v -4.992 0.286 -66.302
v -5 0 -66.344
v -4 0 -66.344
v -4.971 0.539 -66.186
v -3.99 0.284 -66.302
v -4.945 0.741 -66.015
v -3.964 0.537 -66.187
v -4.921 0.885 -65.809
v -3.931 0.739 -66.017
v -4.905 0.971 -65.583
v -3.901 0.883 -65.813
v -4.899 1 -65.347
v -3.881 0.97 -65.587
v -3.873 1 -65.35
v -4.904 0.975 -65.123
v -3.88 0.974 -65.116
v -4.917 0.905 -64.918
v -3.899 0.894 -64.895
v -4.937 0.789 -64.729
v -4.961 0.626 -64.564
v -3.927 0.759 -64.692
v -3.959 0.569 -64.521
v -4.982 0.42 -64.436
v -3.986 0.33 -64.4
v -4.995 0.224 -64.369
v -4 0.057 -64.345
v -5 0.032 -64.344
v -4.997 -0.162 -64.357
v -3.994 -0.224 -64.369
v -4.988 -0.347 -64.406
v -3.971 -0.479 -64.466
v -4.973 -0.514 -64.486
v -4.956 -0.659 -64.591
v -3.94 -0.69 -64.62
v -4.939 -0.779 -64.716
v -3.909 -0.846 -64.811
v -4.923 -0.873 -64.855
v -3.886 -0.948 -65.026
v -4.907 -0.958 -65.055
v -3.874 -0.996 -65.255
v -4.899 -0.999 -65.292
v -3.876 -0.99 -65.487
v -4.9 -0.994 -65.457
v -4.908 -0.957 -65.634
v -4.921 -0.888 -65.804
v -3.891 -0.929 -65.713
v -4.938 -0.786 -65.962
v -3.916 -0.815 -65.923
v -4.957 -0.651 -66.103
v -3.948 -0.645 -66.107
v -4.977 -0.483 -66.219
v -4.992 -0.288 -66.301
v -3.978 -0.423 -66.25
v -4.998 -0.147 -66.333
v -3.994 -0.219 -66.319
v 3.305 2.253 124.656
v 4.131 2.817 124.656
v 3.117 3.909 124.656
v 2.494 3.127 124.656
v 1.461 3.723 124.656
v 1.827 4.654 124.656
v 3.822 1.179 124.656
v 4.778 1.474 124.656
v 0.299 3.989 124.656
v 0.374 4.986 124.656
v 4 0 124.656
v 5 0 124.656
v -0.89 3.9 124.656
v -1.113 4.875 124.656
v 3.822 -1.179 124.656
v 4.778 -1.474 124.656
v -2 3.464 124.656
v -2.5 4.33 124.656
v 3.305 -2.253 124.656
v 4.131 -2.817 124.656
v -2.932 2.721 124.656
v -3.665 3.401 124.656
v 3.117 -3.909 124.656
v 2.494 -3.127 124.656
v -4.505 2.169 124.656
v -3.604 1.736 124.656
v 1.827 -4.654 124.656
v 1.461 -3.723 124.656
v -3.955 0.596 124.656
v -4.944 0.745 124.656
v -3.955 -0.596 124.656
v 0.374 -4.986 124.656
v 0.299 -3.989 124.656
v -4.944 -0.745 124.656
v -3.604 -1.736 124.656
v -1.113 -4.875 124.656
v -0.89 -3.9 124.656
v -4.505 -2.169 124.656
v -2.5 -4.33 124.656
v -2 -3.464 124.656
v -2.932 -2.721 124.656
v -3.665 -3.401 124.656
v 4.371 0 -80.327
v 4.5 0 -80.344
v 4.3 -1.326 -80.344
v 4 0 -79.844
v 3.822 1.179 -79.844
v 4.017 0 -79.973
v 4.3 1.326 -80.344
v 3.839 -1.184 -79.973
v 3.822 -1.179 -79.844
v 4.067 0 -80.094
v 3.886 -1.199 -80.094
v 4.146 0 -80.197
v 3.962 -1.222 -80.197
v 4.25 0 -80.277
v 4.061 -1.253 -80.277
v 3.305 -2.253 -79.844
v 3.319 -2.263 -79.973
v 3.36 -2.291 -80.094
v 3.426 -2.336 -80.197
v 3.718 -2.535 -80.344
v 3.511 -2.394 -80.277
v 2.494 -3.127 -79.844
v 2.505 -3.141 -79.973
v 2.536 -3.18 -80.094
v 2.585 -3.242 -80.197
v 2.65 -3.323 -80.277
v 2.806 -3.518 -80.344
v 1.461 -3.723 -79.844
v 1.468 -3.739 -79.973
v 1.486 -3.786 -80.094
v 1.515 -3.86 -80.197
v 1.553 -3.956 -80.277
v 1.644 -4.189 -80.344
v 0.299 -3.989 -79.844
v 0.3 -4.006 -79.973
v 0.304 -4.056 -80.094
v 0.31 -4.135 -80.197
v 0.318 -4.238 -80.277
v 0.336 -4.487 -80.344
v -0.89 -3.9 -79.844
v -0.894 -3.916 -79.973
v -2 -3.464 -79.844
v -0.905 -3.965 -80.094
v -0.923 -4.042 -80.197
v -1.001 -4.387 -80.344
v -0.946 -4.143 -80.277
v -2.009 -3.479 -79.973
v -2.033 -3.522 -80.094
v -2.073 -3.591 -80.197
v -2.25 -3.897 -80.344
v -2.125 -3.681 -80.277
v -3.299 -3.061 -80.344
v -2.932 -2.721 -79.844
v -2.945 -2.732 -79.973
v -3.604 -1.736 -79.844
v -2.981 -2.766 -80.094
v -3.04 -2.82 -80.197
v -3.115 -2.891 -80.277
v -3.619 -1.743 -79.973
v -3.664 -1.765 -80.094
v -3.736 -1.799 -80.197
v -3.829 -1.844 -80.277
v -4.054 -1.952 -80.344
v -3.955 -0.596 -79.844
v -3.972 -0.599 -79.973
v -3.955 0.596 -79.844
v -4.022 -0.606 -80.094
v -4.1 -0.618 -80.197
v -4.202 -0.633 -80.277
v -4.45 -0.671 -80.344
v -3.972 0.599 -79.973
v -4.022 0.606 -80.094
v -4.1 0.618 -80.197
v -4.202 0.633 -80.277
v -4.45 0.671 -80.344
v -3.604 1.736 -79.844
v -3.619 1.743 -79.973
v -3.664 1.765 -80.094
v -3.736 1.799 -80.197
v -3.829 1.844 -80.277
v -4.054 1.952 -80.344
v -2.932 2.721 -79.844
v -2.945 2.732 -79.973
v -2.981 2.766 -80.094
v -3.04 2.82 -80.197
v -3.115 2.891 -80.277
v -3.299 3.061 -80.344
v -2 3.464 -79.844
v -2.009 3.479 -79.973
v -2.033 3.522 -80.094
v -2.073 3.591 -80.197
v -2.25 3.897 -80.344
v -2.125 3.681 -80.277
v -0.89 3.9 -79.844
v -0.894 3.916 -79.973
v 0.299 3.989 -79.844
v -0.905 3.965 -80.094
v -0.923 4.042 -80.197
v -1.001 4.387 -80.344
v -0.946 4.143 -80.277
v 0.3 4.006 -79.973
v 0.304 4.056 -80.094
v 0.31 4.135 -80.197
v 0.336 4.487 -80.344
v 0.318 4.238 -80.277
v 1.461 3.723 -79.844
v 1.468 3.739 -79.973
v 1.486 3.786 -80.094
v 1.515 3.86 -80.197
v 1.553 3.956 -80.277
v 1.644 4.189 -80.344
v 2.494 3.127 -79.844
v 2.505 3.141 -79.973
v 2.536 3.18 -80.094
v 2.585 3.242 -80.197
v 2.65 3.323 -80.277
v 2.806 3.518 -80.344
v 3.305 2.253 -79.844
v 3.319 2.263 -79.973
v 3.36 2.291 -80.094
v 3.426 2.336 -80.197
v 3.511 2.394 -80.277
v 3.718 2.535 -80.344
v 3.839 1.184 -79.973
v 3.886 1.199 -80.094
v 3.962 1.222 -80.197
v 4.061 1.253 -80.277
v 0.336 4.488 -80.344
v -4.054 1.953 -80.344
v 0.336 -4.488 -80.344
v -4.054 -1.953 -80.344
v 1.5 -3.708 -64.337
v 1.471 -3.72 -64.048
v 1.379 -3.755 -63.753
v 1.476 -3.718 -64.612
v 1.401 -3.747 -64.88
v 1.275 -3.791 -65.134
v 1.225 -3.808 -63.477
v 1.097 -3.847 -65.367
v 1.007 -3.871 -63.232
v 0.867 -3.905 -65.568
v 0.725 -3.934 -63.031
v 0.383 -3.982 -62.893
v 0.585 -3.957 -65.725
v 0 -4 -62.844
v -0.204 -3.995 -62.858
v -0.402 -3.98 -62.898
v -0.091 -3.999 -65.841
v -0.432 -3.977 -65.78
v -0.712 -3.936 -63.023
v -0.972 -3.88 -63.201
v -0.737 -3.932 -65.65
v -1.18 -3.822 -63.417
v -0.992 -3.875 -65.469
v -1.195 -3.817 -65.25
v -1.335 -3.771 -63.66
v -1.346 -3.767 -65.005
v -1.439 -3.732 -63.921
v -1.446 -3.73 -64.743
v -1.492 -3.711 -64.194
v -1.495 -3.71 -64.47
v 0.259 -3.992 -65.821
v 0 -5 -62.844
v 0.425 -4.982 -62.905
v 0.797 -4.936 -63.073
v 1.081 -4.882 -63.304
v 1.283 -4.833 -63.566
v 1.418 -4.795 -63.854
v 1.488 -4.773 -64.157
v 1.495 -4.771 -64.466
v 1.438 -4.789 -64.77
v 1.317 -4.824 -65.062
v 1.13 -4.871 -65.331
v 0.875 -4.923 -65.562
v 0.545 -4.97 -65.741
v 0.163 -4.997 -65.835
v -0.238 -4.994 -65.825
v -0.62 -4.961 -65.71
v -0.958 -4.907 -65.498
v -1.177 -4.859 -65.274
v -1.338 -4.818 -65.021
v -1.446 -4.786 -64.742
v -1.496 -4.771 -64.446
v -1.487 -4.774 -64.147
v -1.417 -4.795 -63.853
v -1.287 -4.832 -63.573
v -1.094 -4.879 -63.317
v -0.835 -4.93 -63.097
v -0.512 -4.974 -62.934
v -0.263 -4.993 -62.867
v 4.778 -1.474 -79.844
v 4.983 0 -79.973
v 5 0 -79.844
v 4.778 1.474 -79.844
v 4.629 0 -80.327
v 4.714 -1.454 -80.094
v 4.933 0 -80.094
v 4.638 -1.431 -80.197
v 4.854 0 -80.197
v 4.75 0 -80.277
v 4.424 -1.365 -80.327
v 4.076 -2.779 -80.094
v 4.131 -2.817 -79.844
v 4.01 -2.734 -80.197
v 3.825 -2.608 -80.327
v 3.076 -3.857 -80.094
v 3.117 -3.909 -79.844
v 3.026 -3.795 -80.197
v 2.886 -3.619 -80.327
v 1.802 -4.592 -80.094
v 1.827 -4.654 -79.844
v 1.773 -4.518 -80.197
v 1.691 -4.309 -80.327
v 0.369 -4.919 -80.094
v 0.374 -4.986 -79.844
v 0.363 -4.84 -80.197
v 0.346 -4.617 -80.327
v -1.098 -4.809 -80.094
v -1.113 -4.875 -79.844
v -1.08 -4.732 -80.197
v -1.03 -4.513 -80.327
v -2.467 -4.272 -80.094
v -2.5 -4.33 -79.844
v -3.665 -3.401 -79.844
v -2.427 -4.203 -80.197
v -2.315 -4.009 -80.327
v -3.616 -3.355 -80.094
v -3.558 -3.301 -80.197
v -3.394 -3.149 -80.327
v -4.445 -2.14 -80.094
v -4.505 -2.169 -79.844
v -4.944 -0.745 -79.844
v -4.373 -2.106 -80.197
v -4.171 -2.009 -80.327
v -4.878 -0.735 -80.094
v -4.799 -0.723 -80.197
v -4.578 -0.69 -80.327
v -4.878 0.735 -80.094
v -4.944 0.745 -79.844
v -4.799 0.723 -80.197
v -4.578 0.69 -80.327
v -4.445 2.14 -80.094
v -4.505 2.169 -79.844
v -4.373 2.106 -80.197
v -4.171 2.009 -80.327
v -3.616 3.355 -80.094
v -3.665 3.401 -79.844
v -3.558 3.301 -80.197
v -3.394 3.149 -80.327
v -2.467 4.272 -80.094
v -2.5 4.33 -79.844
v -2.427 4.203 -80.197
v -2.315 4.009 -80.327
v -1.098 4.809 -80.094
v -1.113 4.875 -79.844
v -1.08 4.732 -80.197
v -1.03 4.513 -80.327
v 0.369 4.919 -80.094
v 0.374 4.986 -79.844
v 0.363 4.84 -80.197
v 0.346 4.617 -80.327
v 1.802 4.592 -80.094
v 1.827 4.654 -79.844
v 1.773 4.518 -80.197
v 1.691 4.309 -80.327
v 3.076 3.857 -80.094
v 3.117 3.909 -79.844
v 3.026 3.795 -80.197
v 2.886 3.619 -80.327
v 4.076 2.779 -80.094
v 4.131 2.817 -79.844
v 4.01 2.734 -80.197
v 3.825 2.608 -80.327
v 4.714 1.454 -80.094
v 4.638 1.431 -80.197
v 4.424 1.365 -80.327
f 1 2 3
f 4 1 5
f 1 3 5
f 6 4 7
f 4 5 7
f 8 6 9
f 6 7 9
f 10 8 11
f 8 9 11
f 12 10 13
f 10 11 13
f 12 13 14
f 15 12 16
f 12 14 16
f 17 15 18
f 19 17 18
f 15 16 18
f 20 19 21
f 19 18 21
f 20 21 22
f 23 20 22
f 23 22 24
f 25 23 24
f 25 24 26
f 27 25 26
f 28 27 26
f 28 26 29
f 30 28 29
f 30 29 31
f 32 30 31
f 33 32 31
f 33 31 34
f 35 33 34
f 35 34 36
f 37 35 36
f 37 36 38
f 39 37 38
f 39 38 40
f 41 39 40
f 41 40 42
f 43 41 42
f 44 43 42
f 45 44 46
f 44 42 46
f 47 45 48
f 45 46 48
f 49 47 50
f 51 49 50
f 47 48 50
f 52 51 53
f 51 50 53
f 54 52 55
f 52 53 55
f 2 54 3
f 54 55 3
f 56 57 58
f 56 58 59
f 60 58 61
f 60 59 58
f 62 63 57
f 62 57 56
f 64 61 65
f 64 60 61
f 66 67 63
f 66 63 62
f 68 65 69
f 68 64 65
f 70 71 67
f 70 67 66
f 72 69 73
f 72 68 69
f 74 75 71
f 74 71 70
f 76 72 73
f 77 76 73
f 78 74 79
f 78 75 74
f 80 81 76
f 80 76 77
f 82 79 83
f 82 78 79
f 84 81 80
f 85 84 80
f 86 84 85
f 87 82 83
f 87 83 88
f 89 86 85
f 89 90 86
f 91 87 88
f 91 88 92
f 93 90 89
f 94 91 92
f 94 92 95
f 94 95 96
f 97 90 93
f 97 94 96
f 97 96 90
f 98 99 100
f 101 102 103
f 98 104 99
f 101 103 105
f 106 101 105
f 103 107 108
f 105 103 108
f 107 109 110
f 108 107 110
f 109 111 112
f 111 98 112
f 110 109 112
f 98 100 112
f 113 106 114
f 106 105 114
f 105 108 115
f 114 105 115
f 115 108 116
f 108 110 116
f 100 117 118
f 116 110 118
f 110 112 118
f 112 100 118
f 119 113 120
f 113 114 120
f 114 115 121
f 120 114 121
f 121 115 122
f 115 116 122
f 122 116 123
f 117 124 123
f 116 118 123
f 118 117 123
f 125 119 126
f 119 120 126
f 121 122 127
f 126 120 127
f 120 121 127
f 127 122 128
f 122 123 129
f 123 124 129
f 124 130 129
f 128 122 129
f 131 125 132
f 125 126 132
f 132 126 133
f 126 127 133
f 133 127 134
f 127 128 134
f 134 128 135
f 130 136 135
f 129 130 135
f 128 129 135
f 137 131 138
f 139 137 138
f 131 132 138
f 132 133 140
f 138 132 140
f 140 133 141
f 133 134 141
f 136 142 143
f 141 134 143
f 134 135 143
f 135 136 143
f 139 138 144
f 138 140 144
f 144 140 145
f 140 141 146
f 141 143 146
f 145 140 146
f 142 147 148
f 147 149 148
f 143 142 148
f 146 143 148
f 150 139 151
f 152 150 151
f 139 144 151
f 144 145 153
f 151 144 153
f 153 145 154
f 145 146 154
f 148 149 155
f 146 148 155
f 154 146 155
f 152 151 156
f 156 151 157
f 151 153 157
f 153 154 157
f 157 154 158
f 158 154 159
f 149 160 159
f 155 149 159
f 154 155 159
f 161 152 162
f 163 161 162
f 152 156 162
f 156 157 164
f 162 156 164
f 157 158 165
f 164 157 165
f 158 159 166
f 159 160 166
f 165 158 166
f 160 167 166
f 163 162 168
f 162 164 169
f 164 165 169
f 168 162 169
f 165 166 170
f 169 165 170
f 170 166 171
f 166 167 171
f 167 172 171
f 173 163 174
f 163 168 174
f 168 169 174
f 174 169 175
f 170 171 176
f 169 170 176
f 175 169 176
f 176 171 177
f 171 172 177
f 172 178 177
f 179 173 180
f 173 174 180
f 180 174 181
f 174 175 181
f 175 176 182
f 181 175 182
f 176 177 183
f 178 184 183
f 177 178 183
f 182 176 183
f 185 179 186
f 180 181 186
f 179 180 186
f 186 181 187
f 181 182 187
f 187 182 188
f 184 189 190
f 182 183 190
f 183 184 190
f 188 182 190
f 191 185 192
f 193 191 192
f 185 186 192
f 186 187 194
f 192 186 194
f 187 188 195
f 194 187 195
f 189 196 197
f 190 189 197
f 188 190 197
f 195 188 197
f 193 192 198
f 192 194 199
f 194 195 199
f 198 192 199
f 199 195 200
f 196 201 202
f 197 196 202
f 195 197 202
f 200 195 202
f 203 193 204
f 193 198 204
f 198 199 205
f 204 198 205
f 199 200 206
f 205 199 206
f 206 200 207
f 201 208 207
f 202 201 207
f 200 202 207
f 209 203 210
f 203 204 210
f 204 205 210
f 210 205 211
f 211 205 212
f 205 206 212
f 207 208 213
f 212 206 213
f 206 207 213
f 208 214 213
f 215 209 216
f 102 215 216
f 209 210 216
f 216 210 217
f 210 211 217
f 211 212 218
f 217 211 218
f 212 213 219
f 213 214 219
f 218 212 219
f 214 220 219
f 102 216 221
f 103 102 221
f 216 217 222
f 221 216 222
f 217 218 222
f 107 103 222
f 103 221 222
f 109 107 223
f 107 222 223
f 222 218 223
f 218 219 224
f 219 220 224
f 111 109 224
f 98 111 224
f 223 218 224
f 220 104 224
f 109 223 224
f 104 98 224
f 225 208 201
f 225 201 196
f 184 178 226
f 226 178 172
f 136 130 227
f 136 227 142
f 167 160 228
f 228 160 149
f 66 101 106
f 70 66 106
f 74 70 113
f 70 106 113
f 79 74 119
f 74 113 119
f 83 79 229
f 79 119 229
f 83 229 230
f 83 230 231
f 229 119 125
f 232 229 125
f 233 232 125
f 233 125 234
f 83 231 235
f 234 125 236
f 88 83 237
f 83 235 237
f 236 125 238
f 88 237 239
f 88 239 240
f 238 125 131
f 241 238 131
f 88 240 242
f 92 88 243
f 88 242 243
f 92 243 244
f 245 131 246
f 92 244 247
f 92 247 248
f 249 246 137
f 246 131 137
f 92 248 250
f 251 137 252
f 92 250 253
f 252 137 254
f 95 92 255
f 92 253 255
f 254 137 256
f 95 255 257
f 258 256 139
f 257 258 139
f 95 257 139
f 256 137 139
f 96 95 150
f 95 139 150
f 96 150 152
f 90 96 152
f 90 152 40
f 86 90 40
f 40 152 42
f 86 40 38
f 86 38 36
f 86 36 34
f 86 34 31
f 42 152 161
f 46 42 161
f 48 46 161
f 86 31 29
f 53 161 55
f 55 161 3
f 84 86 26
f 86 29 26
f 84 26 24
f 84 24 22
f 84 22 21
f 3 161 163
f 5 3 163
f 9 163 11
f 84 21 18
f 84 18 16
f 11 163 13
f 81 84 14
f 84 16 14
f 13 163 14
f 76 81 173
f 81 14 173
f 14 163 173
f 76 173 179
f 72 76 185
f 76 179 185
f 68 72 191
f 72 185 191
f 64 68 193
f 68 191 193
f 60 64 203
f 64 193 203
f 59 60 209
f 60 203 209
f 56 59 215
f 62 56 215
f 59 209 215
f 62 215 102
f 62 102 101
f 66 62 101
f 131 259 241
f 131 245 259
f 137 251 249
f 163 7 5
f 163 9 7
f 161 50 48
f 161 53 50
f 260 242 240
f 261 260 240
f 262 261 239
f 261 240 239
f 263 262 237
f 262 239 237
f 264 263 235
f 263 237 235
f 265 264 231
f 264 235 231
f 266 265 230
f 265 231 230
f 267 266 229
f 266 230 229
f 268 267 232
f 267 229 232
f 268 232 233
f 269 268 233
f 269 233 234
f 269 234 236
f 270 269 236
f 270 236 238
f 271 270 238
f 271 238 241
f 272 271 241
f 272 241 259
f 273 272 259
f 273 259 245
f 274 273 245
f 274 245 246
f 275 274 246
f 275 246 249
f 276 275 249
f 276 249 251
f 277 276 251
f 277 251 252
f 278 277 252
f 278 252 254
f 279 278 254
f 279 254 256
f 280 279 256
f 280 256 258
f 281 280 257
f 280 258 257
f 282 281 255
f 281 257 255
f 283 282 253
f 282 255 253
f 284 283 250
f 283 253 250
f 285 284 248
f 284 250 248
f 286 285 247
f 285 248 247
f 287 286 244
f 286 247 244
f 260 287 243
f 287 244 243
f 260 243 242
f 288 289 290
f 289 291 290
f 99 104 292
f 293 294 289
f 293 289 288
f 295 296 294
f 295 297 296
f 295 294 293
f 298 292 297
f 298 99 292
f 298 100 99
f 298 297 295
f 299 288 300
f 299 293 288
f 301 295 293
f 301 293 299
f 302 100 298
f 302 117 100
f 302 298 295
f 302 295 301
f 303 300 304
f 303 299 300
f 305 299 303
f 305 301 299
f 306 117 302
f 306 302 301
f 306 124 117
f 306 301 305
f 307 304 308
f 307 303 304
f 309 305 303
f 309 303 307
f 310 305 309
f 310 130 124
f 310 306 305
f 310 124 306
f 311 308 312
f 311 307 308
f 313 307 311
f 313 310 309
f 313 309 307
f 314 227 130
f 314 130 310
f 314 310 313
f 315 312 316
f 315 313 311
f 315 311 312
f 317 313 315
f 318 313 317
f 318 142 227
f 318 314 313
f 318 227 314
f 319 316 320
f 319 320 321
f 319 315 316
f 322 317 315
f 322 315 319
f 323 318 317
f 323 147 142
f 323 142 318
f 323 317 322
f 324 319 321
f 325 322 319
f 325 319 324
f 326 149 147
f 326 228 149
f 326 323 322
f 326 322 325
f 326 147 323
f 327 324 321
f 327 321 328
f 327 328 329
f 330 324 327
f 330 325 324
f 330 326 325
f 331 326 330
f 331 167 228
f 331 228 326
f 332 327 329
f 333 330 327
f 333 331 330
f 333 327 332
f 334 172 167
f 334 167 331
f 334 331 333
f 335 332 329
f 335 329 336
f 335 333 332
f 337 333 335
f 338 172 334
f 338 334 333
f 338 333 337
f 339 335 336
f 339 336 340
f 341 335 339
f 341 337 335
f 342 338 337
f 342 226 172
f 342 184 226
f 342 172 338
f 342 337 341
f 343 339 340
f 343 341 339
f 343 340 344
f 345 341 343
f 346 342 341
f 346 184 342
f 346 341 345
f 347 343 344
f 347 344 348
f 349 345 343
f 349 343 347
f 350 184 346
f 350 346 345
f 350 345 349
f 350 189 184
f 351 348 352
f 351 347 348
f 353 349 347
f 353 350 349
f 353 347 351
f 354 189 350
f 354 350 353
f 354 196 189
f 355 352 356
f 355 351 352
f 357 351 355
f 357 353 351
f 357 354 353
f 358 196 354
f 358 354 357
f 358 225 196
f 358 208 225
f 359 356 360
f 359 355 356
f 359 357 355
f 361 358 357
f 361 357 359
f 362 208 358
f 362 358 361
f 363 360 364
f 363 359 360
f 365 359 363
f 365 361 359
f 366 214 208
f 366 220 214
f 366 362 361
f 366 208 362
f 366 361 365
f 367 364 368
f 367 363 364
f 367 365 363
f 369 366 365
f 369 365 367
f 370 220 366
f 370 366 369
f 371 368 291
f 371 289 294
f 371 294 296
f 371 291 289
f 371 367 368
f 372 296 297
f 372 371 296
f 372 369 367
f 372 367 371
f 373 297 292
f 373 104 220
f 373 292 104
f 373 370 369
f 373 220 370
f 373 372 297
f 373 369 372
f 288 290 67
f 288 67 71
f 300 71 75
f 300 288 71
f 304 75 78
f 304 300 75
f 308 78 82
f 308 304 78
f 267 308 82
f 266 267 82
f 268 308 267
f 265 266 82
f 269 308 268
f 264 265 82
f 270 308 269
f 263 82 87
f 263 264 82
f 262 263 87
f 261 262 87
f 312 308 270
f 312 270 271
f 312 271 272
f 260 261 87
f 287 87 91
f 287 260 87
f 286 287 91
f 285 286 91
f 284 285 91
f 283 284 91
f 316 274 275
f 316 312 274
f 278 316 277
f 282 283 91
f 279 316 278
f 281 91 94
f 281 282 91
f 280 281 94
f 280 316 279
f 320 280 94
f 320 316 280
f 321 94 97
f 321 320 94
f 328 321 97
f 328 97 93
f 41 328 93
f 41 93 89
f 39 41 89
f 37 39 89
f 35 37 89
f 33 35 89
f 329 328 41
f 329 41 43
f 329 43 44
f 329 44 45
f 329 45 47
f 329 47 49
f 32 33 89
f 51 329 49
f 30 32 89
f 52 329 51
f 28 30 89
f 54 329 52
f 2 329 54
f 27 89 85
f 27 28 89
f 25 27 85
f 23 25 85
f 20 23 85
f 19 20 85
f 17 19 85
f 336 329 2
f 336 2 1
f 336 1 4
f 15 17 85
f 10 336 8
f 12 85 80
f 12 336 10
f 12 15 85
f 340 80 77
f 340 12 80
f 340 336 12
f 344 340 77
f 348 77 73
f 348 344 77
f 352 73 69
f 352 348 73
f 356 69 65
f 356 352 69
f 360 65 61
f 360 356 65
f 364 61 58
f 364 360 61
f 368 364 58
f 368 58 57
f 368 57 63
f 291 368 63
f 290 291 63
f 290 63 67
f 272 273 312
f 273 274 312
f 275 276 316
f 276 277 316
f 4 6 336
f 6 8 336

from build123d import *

# Parameters (mm, degrees)
SCHIZZO1_W               = 205
SCHIZZO1_H               = 1
SCHIZZO2_R               = 1.5
TAGLIO_ESTRUSIONE1_DEPTH = 10
SCHIZZO3_R               = 1
TAGLIO_ESTRUSIONE2_DEPTH = 10
RACCORDO4_R              = 0.5


with BuildPart() as part:
    # Schizzo1 → Rivoluzione1 (revolve)
    with BuildSketch(Plane(origin=(0, 0, 0), x_dir=(0, 0, -1), z_dir=(1, 0, 0)), mode=Mode.PRIVATE) as rivoluzione1_sk:
        with Locations((-22.156399009, 4.5)):
            Rectangle(SCHIZZO1_W, SCHIZZO1_H)
    revolve(rivoluzione1_sk.sketch.rotate(Axis((0, 0, 65.406887886), (0, 0, -1)), 90), axis=Axis((0, 0, 65.406887886), (0, 0, -1)))

    # Schizzo2 → Taglio-Estrusione1 (cut)
    with BuildSketch(Plane(origin=(0, 0, 0), x_dir=(1, 0, 0), z_dir=(0, 1, 0))):
        with Locations(Location((0, 64.343600991, 0), (0, 0, 270))):
            Circle(SCHIZZO2_R)
    extrude(amount=-TAGLIO_ESTRUSIONE1_DEPTH, mode=Mode.SUBTRACT)

    # Schizzo3 → Taglio-Estrusione2 (cut)
    with BuildSketch(Plane(origin=(0, 0, 0), x_dir=(0, 0, -1), z_dir=(1, 0, 0))):
        with Locations((65.343600991, 0)):
            Circle(SCHIZZO3_R)
    extrude(amount=-TAGLIO_ESTRUSIONE2_DEPTH, mode=Mode.SUBTRACT)

    # Raccordo4
    raccordo4_edges = [part.edges().sort_by_distance(p)[0] for p in [
        (-5, 0, -80.343600991),
        (-4, 0, -80.343600991),
    ]]
    fillet(raccordo4_edges, radius=RACCORDO4_R - 0.0001)  # a hair under: the kernel refuses the full size


solid = part.part
